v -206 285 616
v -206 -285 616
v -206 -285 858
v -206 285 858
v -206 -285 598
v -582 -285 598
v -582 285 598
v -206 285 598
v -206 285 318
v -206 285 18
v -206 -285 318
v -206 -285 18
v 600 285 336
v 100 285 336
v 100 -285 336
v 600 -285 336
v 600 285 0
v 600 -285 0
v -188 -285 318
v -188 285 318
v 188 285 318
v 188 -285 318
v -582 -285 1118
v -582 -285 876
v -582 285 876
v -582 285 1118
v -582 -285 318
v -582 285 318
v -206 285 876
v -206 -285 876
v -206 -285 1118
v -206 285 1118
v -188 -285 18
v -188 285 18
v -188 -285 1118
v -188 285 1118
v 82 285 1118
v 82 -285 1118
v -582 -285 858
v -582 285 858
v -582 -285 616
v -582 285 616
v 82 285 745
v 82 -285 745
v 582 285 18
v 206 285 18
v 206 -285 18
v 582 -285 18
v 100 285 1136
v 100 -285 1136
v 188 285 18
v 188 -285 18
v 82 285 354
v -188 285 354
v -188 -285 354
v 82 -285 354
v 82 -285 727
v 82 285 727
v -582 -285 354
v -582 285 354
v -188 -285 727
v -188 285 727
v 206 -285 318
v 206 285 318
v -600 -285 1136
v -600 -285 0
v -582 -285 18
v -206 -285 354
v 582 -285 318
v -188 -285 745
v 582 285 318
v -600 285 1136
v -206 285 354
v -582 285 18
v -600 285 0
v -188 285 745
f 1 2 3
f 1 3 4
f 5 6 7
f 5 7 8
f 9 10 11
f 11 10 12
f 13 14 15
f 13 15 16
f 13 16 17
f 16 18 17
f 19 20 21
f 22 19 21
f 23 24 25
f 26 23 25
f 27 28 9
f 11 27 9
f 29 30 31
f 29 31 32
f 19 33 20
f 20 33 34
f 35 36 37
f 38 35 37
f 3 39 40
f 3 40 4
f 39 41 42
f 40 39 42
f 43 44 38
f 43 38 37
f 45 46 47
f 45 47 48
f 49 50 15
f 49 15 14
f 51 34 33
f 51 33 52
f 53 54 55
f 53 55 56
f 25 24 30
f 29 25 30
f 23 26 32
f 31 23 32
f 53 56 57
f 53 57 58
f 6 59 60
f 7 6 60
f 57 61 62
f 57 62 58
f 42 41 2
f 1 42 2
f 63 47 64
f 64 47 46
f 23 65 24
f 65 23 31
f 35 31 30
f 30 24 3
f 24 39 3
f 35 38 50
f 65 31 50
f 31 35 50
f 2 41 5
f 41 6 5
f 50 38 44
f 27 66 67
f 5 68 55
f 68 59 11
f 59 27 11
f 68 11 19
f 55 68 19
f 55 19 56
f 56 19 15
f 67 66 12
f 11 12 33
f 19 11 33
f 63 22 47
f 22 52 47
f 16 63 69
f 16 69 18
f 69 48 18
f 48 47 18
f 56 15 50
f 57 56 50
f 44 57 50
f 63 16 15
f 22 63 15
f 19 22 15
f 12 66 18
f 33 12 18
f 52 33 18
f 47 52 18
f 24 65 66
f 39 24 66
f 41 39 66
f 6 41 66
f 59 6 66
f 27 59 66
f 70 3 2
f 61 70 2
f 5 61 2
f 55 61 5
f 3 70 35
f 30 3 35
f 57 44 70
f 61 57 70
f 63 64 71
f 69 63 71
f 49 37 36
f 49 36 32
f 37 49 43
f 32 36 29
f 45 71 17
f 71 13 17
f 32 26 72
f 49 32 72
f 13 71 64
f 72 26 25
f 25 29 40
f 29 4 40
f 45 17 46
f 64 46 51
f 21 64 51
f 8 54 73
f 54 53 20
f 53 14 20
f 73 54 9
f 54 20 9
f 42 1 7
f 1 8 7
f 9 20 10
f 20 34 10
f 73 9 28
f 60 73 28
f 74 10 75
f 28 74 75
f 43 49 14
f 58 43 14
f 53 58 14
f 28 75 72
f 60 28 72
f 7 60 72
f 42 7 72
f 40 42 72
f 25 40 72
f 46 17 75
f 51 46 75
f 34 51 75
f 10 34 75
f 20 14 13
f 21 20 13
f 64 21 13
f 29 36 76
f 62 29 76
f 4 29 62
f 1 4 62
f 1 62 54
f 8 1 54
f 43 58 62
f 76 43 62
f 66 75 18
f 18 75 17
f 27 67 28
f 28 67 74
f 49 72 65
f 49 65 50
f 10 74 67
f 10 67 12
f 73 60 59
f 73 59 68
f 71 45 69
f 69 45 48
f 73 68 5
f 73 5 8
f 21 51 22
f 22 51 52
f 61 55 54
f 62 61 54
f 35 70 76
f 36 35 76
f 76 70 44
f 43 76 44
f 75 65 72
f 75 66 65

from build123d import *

# Parameters (mm, degrees)
F0_W      = 1200
F0_H      = 570
F1_DEPTH  = 18
F3_DEPTH  = 300
F4_W      = 1200
F4_H      = 570
F5_DEPTH  = 18
F6_W      = 700
F6_H      = 570
F7_DEPTH  = 18
F8_W      = 18
F8_H      = 570
F9_DEPTH  = 764
F10_W     = 682
F10_H     = 570
F10_W_2   = 18
F11_DEPTH = 18
F12_W     = 18
F12_H     = 570
F13_DEPTH = 764
F14_W     = 270
F14_H     = 18
F14_W_2   = 376
F15_DEPTH = 570


with BuildPart() as f1:
    # F0 (on Top) → F1 (new body)
    with BuildSketch(Plane.XY):
        Rectangle(F0_W, F0_H)
    extrude(amount=F1_DEPTH)

    # F2 (on face) → F3 (join)
    with BuildSketch(Plane.XY.offset(18)):
        Polygon((-582, 285), (-600, 285), (-600, -285), (-582, -285), (-582, 92.4397557974), align=None)
        Polygon((-188, 285), (-206, 285), (-206, 92.4397557974), (-206, -285), (-188, -285), (-188, 93.6823561788), align=None)
        Polygon((206, 285), (188, 285), (188, 93.6823561788), (188, -285), (206, -285), (206, 93.6823785305), align=None)
        Polygon((600, 285), (582, 285), (582, 93.6823785305), (582, -285), (600, -285), align=None)
    extrude(amount=F3_DEPTH)

    # F4 (on face) → F5 (join)
    with BuildSketch(Plane.XY.offset(318)):
        Rectangle(F4_W, F4_H)
    extrude(amount=F5_DEPTH)

    # F6 (on face) → F7 (join)
    with BuildSketch(Plane.XY.offset(336)):
        with Locations((-250, 0)):
            Rectangle(F6_W, F6_H)
    extrude(amount=F7_DEPTH)

    # F8 (on face) → F9 (join)
    with BuildSketch(Plane.XY.offset(354)):
        with Locations((-591, 0)):
            Rectangle(F8_W, F8_H)
        with Locations((91, 0)):
            Rectangle(F8_W, F8_H)
    extrude(amount=F9_DEPTH)

    # F10 (on face) → F11 (join)
    with BuildSketch(Plane.XY.offset(1118)):
        with Locations((-259, 0)):
            Rectangle(F10_W, F10_H)
        with Locations((91, 0)):
            Rectangle(F10_W_2, F10_H)
    extrude(amount=F11_DEPTH)

    # F12 (on face) → F13 (join)
    with BuildSketch(Plane.XY.offset(354)):
        with Locations((-197, 0)):
            Rectangle(F12_W, F12_H)
    extrude(amount=F13_DEPTH)

    # F14 (on face) → F15 (join)
    with BuildSketch(Plane.XZ.offset(285)):
        with Locations((-53, 736)):
            Rectangle(F14_W, F14_H)
        with Locations((-394, 867)):
            Rectangle(F14_W_2, F14_H)
        with Locations((-394, 607)):
            Rectangle(F14_W_2, F14_H)
    extrude(amount=-F15_DEPTH)


solid = f1.part
